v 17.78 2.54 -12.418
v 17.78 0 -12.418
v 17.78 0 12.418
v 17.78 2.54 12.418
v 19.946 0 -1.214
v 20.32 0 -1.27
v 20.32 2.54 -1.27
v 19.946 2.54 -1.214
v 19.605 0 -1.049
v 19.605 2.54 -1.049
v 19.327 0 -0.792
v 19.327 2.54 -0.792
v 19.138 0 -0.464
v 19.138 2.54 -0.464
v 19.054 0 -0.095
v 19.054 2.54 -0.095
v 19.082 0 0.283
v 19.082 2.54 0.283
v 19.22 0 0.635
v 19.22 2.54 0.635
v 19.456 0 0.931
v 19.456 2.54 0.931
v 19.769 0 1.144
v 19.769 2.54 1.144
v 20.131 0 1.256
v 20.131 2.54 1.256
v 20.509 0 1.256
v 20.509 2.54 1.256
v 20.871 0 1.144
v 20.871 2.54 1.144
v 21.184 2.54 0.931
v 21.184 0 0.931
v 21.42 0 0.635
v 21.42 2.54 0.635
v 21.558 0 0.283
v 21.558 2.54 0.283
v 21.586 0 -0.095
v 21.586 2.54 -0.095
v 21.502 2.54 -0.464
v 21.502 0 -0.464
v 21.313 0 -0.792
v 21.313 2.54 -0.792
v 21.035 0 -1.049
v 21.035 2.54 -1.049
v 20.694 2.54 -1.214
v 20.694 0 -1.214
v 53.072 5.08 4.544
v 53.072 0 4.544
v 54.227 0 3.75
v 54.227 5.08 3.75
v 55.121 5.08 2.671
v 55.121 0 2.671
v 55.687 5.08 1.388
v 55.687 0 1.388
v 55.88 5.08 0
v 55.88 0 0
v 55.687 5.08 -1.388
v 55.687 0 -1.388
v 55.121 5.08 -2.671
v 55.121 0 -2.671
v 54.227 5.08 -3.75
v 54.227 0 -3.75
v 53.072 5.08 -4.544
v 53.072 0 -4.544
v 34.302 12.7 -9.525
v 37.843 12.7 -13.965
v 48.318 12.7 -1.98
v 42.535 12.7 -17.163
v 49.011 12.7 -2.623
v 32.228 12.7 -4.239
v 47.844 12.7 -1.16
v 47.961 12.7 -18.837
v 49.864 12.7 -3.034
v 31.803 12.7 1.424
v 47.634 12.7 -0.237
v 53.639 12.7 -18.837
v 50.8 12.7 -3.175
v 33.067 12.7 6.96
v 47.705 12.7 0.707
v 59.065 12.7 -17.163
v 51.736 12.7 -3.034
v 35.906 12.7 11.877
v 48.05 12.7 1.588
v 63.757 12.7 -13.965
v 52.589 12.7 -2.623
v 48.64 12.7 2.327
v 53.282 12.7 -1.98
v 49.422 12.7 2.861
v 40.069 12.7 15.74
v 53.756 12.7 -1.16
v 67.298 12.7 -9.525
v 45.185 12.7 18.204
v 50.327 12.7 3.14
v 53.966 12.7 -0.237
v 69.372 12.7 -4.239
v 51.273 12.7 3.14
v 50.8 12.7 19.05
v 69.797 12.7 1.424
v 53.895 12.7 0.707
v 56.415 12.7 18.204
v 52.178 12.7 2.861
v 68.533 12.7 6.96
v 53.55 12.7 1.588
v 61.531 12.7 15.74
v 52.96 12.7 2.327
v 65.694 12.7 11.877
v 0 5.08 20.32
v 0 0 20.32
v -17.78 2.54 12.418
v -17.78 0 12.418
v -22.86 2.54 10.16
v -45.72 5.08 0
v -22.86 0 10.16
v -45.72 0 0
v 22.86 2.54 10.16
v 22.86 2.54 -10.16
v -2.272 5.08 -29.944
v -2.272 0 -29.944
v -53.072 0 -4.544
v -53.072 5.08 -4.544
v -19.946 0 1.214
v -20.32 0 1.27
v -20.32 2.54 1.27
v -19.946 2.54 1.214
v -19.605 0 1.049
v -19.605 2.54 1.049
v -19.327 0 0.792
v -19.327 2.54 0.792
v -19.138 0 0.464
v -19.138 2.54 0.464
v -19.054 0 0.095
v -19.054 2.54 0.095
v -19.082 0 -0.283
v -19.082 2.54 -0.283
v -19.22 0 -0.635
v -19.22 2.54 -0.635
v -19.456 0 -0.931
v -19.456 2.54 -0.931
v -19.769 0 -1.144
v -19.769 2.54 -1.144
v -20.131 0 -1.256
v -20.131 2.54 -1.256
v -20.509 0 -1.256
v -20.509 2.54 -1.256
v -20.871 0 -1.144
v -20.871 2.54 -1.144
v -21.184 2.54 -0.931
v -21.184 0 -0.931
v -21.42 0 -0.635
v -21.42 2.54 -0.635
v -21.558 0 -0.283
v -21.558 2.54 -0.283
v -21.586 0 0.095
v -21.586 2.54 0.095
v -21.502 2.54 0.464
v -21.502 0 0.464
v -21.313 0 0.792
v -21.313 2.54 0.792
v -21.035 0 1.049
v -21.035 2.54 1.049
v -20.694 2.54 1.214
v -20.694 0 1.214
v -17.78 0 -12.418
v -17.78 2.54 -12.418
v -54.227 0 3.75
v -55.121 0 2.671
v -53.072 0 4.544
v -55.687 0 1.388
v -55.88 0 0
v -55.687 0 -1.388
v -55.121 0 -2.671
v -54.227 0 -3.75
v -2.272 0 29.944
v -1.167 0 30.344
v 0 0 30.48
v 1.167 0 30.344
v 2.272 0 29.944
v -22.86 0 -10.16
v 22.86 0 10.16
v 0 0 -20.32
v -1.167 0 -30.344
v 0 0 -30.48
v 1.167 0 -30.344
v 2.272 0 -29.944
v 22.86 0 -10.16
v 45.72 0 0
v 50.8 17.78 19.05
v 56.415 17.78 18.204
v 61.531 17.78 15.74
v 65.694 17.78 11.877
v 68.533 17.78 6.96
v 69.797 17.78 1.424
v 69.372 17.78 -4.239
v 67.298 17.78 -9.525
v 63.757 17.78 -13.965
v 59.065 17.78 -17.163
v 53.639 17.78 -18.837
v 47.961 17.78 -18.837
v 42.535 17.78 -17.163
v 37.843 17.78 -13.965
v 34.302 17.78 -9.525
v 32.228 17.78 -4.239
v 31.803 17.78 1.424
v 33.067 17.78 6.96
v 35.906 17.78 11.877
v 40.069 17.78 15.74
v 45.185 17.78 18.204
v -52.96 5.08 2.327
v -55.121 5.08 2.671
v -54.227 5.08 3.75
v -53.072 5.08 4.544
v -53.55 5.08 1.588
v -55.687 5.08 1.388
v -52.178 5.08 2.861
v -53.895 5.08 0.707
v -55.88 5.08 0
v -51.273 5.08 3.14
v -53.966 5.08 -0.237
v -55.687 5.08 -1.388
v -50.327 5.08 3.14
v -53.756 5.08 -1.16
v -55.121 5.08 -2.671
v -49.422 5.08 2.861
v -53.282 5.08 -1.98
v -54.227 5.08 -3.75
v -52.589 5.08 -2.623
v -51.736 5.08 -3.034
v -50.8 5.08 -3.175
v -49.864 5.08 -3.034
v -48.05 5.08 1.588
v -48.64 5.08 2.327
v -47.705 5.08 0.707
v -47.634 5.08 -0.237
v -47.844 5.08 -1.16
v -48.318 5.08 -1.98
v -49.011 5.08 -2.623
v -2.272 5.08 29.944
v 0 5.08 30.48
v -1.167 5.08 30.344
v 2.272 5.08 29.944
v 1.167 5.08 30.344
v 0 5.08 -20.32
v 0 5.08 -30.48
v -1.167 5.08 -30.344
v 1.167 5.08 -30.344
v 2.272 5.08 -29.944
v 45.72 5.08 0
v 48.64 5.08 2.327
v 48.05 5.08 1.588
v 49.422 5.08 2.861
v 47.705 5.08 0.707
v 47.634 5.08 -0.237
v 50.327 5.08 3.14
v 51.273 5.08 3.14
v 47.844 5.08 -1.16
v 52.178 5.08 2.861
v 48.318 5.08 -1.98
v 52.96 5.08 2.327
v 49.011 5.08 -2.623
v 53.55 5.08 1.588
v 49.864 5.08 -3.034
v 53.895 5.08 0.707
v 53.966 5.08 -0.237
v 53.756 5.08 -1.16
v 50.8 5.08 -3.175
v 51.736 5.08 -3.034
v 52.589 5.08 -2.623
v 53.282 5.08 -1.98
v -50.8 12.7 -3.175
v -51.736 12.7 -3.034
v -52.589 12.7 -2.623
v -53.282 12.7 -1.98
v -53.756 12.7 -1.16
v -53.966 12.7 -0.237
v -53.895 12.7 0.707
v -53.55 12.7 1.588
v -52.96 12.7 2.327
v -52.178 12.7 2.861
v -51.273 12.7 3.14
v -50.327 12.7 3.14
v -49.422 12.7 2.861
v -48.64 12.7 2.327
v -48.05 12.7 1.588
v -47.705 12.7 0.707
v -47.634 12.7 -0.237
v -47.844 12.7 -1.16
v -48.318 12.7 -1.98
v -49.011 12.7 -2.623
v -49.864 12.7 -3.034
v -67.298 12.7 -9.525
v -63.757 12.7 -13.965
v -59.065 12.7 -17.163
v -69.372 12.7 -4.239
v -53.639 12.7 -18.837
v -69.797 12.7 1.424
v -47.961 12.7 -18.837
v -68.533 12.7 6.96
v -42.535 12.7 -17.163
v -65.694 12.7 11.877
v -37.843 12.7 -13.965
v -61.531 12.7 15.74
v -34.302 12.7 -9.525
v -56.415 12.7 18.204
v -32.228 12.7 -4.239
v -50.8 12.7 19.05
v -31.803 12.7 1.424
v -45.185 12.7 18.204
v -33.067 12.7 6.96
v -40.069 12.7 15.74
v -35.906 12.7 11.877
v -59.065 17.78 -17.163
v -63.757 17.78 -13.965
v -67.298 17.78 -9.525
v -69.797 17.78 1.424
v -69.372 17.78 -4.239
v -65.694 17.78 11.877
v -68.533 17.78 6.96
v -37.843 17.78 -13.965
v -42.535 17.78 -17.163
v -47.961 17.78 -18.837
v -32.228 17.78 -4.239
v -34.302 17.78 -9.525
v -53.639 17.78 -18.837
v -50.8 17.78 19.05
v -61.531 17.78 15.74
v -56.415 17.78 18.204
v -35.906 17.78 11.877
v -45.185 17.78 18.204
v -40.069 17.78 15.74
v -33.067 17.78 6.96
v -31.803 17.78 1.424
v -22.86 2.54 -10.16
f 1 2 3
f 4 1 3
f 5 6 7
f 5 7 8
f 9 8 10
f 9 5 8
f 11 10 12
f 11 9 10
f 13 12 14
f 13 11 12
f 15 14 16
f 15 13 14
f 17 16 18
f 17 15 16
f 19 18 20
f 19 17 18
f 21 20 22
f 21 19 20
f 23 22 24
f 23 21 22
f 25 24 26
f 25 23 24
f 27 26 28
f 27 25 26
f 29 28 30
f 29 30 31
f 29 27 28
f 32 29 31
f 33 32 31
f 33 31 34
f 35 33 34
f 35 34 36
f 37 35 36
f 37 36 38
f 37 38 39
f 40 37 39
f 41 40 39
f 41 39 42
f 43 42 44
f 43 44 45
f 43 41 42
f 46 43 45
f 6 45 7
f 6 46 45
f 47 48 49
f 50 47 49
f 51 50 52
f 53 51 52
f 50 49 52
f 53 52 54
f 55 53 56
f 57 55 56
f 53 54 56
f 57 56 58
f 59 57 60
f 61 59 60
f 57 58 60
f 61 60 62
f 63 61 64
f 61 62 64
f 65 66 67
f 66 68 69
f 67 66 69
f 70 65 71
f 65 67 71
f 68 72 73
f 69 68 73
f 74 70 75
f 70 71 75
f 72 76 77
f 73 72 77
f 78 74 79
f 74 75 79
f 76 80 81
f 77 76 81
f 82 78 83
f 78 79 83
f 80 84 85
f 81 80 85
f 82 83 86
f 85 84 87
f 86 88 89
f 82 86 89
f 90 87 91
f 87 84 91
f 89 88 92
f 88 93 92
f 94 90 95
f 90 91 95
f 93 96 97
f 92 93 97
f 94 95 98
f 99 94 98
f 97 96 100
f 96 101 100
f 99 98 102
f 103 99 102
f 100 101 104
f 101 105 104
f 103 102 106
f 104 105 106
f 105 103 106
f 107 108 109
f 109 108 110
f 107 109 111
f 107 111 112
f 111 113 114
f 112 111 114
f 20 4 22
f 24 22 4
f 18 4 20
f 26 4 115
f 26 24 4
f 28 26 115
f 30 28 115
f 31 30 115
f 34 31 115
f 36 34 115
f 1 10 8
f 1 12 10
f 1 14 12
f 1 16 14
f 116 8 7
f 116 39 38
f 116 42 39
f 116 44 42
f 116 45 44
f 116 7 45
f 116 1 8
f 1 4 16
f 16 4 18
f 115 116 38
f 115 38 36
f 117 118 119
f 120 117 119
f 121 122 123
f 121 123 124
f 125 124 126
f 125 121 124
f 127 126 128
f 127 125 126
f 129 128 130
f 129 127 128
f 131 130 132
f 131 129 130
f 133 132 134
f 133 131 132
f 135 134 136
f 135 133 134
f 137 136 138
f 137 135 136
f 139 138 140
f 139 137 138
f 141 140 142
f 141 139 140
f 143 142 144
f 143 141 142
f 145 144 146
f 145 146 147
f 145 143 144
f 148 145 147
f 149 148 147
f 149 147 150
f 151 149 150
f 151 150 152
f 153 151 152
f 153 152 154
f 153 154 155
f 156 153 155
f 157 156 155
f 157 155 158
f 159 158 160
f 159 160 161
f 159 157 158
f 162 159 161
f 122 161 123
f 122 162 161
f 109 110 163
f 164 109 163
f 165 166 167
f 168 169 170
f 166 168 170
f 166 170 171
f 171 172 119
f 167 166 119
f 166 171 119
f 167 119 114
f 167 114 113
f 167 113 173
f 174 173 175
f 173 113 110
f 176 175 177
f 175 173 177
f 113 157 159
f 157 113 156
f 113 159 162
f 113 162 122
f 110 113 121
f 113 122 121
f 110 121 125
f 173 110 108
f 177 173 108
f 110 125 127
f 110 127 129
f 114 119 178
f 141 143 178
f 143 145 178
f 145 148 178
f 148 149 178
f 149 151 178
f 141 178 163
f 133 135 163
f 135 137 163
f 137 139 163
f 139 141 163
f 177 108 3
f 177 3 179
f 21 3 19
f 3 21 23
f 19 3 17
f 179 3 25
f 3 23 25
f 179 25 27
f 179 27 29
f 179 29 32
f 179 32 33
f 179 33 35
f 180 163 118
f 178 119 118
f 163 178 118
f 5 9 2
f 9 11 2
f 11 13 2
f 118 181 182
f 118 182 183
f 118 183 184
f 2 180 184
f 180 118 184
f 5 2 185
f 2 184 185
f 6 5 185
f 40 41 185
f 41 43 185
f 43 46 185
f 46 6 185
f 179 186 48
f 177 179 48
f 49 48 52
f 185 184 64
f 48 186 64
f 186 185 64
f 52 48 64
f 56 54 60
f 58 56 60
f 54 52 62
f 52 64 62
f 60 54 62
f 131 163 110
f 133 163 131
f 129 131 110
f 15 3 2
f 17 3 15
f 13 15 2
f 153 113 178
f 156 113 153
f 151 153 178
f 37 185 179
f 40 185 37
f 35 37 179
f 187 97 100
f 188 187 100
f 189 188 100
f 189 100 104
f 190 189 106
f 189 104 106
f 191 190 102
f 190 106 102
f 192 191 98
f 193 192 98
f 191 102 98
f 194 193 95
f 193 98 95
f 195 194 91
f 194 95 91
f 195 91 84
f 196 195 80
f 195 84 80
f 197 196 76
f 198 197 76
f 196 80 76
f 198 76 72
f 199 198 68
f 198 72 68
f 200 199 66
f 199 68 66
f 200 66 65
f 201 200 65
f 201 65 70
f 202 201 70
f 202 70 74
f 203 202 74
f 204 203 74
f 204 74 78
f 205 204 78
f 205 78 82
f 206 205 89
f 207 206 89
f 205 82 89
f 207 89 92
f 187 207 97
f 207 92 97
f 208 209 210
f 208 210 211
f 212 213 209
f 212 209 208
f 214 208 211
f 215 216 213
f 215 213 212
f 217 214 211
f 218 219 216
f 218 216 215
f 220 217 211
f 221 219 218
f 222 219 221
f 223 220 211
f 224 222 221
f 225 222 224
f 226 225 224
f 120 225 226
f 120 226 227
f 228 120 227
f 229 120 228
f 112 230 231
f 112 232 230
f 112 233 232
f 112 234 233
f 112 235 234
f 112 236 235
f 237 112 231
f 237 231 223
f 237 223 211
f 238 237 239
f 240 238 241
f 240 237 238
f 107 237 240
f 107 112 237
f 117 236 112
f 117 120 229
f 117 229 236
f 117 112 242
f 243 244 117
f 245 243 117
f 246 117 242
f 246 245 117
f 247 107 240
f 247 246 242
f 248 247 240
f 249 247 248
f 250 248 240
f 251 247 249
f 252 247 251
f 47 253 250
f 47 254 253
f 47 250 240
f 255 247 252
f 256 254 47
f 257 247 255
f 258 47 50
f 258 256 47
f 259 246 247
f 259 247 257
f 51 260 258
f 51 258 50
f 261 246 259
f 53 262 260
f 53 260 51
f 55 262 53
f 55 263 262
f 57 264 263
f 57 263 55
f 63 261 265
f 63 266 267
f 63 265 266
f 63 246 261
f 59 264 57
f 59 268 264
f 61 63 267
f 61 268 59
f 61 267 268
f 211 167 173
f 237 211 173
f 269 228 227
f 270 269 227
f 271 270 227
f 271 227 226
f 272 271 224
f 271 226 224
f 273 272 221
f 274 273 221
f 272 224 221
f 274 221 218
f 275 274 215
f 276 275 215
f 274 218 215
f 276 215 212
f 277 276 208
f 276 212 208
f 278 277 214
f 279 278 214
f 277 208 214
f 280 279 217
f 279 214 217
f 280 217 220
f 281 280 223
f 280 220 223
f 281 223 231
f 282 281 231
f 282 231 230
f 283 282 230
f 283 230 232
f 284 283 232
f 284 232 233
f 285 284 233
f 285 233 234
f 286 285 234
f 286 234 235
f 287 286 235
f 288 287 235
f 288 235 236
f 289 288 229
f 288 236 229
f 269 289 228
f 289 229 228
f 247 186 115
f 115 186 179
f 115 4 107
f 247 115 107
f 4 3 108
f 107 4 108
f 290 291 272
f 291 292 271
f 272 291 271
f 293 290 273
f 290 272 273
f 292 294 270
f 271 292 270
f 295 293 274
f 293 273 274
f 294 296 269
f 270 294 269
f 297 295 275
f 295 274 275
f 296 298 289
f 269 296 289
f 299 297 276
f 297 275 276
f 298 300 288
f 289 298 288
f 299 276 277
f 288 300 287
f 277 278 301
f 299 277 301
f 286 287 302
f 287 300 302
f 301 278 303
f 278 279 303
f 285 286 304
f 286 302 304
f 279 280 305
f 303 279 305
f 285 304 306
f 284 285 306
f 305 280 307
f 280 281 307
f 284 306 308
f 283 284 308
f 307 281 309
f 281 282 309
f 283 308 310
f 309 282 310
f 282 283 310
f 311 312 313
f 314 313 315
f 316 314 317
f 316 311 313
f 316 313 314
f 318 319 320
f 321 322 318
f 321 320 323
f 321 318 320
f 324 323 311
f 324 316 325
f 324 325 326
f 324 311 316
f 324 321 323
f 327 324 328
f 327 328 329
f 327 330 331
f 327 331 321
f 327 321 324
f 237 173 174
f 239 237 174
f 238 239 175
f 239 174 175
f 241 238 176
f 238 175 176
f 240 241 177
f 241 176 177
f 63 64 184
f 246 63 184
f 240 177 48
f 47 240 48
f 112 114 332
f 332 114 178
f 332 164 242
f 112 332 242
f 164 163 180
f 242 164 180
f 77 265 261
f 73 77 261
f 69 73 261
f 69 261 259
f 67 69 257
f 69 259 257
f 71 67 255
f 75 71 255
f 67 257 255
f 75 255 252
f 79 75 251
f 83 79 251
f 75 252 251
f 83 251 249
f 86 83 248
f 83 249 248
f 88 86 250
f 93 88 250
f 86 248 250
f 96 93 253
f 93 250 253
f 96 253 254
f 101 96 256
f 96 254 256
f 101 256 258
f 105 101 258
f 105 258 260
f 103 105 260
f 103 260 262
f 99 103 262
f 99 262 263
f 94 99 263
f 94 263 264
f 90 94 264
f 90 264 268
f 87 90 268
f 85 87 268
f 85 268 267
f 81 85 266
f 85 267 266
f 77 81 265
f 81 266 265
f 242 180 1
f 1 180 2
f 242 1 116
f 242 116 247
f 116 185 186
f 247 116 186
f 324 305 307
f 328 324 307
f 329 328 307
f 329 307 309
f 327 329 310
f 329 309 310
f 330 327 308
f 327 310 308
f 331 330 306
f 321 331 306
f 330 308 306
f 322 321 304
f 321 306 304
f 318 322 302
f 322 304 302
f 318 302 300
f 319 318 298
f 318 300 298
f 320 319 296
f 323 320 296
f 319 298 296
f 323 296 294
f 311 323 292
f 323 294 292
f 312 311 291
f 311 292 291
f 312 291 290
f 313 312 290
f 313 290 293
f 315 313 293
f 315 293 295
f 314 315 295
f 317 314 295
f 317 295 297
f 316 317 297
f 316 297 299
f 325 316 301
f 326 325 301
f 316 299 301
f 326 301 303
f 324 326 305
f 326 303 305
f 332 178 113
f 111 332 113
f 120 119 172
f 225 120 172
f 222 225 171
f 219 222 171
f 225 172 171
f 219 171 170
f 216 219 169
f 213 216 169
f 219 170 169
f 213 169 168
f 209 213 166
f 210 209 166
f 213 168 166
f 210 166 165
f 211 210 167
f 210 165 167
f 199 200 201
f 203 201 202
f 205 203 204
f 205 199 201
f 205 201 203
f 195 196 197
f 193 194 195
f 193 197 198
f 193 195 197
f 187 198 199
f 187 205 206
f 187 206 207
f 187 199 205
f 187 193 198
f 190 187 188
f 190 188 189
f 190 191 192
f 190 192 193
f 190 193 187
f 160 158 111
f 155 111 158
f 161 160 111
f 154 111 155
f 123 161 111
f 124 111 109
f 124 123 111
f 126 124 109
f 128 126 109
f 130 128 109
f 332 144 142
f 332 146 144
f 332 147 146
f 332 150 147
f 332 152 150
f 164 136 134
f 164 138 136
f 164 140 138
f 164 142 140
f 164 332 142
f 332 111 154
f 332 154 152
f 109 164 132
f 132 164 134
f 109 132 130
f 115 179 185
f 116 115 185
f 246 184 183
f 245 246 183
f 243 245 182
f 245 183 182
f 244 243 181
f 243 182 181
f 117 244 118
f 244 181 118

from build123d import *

# Parameters (mm, degrees)
SKETCH5_R             = 1.27
BOSS_EXTRUDE2_DEPTH   = 2.54
BOSS_EXTRUDE2_2_DEPTH = 2.54
BOSS_EXTRUDE1_DEPTH   = 5.08
SKETCH6_R             = 3.175
BOSS_EXTRUDE3_DEPTH   = 7.62
SKETCH11_R            = 19.05
BOSS_EXTRUDE4_DEPTH   = 5.08
SKETCH13_R            = 19.05
BOSS_EXTRUDE5_DEPTH   = 5.08


with BuildPart() as part:
    # Sketch5 → Boss-Extrude2 (new body)
    with BuildSketch(Plane(origin=(0, 0, 0), x_dir=(1, 0, 0), z_dir=(0, 1, 0))):
        Polygon((-22.86, 10.16), (-22.86, -10.16), (-17.78, -12.417777778), (-17.78, 12.417777778), align=None)
        with Locations(Location((-20.32, 0, 0), (0, 0, 270))):
            Circle(SKETCH5_R, mode=Mode.SUBTRACT)
    extrude(amount=BOSS_EXTRUDE2_DEPTH)



with BuildPart() as body_2:
    # Sketch5 → Boss-Extrude2 2 (new body)
    with BuildSketch(Plane(origin=(0, 0, 0), x_dir=(1, 0, 0), z_dir=(0, 1, 0))):
        Polygon((22.86, 10.16), (17.78, 12.417777778), (17.78, -12.417777778), (22.86, -10.16), align=None)
        with Locations(Location((20.32, 0, 0), (0, 0, 90))):
            Circle(SKETCH5_R, mode=Mode.SUBTRACT)
    extrude(amount=BOSS_EXTRUDE2_2_DEPTH)


with BuildPart() as part_1:
    add(part.part)

    add(body_2.part)  # Boss-Extrude1 merges body 2
    # Sketch2 → Boss-Extrude1 (add)
    with BuildSketch(Plane(origin=(0, 0, 0), x_dir=(1, 0, 0), z_dir=(0, 1, 0))):
        with BuildLine():
            Line((-53.071845065, -4.54369013), (-2.271845065, -29.94369013))
            ThreePointArc((-2.271845065, -29.94369013), (0, -30.48), (2.271845065, -29.94369013))
            Line((2.271845065, -29.94369013), (53.071845065, -4.54369013))
            ThreePointArc((53.071845065, -4.54369013), (55.88, 0), (53.071845065, 4.54369013))
            Line((53.071845065, 4.54369013), (2.271845065, 29.94369013))
            ThreePointArc((2.271845065, 29.94369013), (0, 30.48), (-2.271845065, 29.94369013))
            Line((-2.271845065, 29.94369013), (-53.071845065, 4.54369013))
            ThreePointArc((-53.071845065, 4.54369013), (-55.88, 0), (-53.071845065, -4.54369013))
        make_face()
        Polygon((-45.72, 0), (0, 20.32), (45.72, 0), (0, -20.32), align=None, mode=Mode.SUBTRACT)
    extrude(amount=BOSS_EXTRUDE1_DEPTH)

    # Sketch6 → Boss-Extrude3 (add)
    with BuildSketch(Plane(origin=(0, 5.08, 0), x_dir=(1, 0, 0), z_dir=(0, 1, 0))):
        with Locations(Location((-50.8, 0, 0), (0, 0, 90))):
            Circle(SKETCH6_R)
        with Locations(Location((50.8, 0, 0), (0, 0, 90))):
            Circle(SKETCH6_R)
    extrude(amount=BOSS_EXTRUDE3_DEPTH)

    # Sketch11 → Boss-Extrude4 (add)
    with BuildSketch(Plane(origin=(0, 12.7, 0), x_dir=(1, 0, 0), z_dir=(0, 1, 0))):
        with Locations(Location((-50.8, 0, 0), (0, 0, 270))):
            Circle(SKETCH11_R)
    extrude(amount=BOSS_EXTRUDE4_DEPTH)

    # Sketch13 → Boss-Extrude5 (add)
    with BuildSketch(Plane(origin=(0, 12.7, 0), x_dir=(1, 0, 0), z_dir=(0, 1, 0))):
        with Locations(Location((50.8, 0, 0), (0, 0, 270))):
            Circle(SKETCH13_R)
    extrude(amount=BOSS_EXTRUDE5_DEPTH)


solid = part_1.part
